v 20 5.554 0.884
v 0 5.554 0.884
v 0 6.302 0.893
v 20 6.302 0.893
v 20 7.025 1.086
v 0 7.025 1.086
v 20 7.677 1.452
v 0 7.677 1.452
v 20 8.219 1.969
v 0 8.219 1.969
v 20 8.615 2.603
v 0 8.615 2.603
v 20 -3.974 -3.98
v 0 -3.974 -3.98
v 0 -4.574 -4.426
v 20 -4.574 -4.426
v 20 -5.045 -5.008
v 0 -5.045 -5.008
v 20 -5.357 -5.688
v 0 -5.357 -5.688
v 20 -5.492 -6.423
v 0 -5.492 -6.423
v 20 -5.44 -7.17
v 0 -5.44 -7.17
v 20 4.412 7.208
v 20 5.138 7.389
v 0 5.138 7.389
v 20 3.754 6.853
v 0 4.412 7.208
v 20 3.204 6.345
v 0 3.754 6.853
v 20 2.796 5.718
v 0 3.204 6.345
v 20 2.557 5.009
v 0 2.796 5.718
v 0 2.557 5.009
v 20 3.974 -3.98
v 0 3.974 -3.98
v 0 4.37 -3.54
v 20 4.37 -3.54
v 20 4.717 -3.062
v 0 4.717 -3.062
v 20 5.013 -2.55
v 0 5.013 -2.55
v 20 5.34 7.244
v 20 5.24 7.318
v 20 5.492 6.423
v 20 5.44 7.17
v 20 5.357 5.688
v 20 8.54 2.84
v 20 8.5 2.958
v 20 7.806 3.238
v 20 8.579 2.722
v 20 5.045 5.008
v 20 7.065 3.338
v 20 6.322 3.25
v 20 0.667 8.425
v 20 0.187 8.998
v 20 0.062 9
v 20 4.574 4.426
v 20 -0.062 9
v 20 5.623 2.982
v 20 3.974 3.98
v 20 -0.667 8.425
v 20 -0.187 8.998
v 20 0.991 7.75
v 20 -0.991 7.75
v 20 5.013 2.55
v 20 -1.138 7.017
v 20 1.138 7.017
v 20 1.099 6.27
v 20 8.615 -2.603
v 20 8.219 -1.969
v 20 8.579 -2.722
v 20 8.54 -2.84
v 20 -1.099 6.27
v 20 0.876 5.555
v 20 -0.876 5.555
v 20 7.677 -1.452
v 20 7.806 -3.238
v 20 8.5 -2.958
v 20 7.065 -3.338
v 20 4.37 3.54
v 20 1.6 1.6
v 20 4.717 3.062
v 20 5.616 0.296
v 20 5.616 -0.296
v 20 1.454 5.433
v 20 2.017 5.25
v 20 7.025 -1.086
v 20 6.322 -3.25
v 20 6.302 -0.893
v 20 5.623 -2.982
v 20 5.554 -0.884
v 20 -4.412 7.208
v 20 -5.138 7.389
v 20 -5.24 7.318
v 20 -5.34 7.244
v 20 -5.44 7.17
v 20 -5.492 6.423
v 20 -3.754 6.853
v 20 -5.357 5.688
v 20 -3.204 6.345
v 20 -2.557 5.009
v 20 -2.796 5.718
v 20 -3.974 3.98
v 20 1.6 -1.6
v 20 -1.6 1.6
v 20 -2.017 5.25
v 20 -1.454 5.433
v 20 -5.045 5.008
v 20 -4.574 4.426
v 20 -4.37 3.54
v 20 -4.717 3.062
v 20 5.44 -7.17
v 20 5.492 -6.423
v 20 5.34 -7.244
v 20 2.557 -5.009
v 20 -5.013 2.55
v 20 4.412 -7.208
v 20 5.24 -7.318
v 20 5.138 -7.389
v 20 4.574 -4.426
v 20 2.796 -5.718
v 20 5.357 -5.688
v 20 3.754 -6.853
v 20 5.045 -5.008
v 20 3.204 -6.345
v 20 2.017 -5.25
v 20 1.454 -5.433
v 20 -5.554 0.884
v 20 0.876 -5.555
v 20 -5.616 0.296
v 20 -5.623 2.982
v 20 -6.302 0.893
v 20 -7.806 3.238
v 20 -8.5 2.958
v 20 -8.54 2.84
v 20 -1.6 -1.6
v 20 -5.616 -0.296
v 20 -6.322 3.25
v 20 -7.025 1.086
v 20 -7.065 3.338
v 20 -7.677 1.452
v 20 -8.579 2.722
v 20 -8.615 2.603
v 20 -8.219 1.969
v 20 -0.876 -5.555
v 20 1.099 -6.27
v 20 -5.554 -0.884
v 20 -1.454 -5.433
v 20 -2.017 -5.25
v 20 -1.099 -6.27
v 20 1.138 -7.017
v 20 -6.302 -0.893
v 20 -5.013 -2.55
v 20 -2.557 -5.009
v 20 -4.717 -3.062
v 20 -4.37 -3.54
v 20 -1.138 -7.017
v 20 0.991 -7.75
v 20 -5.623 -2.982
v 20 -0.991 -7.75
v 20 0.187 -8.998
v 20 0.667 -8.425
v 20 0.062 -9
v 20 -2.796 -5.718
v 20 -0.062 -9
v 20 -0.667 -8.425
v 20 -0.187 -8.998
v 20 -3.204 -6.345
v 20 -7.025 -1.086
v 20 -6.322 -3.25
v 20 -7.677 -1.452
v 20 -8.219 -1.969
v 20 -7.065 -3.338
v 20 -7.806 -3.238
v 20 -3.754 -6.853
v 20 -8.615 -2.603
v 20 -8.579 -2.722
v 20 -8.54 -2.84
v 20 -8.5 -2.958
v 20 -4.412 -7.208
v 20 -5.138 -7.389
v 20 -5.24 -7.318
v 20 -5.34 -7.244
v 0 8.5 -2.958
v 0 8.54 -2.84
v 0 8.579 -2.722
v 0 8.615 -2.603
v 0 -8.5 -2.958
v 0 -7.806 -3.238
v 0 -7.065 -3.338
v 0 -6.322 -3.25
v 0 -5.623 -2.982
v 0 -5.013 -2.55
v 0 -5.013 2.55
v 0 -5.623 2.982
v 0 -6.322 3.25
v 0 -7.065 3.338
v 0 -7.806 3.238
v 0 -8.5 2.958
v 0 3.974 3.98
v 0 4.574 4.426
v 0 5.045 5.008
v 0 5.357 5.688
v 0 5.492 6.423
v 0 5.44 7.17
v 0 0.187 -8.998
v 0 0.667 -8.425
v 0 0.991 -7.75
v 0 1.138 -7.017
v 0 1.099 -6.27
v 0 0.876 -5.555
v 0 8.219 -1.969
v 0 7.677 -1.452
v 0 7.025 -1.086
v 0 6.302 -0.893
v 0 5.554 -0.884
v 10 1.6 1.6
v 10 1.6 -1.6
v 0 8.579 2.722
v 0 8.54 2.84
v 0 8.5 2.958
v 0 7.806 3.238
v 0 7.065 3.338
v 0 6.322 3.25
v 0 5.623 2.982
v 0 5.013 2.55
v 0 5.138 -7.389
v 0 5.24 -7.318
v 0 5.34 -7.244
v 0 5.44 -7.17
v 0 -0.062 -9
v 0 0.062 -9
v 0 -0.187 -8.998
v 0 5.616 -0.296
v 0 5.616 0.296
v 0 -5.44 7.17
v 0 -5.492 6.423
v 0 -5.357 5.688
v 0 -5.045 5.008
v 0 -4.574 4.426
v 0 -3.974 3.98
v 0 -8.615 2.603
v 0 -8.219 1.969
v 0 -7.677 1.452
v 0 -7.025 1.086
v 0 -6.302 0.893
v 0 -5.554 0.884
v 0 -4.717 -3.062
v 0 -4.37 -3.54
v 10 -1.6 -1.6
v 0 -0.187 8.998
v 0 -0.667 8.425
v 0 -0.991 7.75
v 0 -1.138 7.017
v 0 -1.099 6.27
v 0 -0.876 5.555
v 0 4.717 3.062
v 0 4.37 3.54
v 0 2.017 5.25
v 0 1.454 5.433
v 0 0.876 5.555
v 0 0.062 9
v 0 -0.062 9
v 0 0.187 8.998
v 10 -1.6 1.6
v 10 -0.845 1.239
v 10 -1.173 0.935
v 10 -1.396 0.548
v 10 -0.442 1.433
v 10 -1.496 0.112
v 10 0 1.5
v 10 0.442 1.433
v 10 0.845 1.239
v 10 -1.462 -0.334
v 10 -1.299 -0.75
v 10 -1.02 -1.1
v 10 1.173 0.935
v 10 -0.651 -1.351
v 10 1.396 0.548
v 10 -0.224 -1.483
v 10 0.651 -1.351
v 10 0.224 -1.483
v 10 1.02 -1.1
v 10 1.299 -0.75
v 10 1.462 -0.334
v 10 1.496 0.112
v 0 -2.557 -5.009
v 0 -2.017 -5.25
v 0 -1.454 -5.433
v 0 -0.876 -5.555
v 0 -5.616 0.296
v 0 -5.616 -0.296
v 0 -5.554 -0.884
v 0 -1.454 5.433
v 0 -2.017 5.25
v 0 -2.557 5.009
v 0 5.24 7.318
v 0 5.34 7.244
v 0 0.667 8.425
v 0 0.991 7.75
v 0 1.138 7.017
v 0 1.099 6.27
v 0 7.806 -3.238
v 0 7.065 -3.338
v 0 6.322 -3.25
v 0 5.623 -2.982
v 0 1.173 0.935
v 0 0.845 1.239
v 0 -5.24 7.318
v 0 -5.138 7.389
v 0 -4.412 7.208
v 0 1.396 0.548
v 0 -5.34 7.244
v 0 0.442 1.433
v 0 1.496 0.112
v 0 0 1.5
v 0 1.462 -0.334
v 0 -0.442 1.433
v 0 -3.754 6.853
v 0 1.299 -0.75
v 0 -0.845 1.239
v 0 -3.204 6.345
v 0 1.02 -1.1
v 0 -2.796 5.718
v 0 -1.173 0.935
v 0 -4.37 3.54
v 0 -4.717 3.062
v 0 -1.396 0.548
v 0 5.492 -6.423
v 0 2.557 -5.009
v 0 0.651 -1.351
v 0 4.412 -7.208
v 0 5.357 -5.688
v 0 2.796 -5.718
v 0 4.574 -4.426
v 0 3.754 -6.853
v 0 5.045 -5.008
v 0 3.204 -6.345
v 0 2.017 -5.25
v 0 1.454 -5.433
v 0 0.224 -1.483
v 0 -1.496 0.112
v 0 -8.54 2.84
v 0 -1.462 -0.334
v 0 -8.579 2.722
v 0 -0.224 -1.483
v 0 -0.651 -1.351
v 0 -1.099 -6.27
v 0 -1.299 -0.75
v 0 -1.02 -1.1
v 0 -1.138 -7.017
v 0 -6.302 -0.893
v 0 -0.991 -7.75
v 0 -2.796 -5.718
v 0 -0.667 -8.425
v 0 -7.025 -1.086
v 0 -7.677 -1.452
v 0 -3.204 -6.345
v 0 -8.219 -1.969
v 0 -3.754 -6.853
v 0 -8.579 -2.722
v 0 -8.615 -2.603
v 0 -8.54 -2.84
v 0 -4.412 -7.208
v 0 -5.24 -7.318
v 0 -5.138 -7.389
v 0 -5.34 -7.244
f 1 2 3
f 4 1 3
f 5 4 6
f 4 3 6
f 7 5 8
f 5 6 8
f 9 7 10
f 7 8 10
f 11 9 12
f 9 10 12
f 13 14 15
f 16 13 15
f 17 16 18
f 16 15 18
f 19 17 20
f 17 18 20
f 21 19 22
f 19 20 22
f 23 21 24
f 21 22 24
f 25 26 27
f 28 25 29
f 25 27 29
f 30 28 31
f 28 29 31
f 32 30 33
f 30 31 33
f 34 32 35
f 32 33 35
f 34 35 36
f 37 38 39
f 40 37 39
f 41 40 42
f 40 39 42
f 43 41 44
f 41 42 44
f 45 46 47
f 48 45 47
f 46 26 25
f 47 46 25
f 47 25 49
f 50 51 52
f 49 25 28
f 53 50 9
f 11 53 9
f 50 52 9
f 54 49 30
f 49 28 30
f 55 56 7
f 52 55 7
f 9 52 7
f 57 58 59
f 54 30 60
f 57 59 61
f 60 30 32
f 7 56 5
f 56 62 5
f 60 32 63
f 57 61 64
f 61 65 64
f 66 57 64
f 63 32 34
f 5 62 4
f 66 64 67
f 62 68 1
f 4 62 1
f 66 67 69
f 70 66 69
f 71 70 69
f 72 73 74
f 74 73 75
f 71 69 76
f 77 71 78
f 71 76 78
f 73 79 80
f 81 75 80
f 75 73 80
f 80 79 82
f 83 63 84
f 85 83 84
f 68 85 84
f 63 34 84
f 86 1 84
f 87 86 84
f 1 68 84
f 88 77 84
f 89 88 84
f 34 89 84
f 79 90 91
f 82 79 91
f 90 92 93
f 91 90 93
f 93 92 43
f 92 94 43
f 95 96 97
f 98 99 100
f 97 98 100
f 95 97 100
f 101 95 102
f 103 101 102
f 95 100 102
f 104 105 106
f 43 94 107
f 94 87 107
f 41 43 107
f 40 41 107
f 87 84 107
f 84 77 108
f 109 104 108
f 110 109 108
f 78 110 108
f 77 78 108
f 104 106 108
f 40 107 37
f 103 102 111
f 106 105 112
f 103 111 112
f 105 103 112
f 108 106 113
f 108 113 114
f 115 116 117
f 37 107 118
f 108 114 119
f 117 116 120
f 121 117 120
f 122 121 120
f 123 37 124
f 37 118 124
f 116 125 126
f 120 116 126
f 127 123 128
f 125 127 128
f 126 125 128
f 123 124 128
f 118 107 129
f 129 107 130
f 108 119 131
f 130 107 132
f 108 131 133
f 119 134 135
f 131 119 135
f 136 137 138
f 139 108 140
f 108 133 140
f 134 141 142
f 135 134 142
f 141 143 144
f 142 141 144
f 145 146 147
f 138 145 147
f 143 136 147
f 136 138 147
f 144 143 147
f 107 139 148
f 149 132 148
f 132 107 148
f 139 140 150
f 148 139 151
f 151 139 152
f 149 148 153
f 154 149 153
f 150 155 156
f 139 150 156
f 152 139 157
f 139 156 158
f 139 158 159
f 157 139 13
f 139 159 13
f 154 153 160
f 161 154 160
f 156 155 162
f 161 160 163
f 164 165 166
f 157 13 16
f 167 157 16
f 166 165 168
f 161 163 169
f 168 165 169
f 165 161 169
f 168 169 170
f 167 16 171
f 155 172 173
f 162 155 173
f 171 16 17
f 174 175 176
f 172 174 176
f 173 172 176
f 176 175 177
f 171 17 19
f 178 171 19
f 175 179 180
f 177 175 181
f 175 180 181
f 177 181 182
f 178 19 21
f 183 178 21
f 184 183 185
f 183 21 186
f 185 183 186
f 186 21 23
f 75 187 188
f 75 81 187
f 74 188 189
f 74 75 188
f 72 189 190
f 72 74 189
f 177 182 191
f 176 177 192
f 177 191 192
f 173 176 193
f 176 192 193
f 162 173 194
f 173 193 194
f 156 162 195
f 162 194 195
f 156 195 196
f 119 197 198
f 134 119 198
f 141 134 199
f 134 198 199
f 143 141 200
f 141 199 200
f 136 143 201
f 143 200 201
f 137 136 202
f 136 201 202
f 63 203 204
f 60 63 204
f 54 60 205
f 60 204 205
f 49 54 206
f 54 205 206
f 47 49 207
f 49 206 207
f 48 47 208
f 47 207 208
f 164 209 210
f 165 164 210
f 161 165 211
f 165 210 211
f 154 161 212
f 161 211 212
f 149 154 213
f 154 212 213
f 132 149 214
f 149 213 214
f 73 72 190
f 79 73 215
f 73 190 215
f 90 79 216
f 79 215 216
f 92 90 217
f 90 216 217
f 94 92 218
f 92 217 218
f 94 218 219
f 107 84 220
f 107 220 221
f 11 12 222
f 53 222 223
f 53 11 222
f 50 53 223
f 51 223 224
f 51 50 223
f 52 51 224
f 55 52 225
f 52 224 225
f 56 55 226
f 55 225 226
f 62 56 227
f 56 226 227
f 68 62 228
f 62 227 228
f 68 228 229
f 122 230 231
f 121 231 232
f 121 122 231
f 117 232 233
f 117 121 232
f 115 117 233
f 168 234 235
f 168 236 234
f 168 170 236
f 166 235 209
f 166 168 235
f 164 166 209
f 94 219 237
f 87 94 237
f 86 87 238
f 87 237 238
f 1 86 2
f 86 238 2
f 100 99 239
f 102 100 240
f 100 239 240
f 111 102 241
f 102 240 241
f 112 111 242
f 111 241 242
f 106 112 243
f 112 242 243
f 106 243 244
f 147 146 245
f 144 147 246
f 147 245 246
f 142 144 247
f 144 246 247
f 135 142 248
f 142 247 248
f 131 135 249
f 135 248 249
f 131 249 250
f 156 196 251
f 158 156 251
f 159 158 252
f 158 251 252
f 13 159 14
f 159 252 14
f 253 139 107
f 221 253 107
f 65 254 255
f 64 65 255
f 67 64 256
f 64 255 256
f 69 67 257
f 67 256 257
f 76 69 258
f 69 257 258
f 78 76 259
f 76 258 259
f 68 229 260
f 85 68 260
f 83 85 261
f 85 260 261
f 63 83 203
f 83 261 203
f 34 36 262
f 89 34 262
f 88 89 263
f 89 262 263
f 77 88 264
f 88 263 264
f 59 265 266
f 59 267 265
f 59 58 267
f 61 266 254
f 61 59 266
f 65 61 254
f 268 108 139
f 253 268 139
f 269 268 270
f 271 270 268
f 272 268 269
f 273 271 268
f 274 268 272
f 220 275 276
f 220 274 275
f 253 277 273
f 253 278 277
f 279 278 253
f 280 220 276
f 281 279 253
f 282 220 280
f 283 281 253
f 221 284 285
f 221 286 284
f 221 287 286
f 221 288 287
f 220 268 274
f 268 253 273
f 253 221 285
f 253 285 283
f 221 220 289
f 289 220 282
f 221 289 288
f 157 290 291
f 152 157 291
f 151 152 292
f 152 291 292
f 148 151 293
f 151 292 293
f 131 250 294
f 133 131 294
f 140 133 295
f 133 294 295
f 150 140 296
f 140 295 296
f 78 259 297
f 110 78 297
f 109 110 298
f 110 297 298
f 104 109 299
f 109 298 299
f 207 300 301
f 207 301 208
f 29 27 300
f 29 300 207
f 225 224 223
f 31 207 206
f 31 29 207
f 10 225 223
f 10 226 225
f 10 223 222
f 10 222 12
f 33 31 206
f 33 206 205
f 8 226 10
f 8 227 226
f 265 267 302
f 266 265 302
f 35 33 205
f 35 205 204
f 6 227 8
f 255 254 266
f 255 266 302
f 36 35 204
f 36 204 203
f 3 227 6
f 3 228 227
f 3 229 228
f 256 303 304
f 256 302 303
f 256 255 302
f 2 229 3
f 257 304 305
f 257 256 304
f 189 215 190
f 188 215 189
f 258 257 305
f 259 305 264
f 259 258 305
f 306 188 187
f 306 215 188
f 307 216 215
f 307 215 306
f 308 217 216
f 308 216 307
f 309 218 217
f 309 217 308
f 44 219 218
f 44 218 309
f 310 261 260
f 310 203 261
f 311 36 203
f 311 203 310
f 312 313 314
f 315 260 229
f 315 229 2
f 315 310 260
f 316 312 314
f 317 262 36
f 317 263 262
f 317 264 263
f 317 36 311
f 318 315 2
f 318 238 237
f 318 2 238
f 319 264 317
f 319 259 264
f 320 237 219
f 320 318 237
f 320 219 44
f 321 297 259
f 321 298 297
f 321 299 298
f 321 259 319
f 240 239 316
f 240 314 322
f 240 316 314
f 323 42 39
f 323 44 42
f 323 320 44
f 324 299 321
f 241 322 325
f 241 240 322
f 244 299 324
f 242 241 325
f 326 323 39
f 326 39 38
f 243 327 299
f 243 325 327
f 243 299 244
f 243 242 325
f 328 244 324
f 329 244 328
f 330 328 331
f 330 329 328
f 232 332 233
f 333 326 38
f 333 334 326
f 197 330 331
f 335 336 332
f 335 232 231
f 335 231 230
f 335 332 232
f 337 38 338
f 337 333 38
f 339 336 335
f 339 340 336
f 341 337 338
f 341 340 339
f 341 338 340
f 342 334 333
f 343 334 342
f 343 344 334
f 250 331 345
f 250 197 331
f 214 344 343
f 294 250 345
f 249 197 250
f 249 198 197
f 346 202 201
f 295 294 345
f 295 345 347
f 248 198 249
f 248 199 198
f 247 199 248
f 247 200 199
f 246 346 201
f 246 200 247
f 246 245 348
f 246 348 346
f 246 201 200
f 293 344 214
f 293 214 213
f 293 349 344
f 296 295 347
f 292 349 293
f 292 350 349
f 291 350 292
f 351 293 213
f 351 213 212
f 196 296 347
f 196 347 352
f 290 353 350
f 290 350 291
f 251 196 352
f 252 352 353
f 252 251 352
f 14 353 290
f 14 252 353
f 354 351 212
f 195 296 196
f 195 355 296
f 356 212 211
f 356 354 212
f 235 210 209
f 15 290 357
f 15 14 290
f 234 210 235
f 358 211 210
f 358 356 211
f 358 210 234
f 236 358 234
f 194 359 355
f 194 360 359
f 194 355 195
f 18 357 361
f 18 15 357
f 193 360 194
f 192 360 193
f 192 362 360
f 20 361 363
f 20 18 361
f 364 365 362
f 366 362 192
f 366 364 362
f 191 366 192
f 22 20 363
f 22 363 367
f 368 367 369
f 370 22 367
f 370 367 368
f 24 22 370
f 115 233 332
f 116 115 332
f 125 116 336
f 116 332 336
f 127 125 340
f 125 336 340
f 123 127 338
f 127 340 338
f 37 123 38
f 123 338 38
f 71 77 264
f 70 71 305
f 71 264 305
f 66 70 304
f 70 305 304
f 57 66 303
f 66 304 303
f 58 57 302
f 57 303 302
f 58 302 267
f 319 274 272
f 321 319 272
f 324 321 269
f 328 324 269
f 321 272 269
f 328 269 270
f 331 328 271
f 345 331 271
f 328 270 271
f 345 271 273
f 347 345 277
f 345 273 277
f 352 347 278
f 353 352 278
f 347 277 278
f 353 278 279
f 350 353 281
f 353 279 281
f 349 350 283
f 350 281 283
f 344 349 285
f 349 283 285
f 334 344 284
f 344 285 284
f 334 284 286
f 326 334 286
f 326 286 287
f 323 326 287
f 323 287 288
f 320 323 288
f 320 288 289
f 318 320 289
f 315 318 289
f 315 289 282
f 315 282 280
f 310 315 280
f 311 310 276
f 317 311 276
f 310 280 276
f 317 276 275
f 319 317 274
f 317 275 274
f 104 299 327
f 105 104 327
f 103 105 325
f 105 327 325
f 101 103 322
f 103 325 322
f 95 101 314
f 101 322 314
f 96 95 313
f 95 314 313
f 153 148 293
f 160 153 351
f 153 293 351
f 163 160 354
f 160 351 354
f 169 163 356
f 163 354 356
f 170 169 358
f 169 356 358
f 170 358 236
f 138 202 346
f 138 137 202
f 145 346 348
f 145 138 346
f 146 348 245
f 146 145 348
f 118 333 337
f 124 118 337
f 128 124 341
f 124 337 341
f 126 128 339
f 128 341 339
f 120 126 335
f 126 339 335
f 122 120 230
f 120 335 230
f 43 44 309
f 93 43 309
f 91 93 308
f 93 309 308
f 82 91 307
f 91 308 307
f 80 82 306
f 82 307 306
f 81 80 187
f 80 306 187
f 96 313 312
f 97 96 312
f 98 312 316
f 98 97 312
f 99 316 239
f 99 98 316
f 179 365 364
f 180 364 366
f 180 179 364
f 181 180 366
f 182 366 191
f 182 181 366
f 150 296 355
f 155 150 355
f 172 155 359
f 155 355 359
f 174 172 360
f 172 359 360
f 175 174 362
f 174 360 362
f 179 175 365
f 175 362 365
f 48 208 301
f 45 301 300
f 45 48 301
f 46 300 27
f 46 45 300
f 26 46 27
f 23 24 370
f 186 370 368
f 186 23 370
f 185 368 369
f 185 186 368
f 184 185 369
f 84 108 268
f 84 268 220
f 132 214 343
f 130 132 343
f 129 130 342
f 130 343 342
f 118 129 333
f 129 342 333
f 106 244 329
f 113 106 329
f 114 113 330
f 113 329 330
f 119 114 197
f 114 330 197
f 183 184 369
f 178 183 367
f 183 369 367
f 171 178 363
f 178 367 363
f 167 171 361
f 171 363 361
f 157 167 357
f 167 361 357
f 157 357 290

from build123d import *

# Parameters (mm, degrees)
BASPROSKE_W        = 20
BASPROSKE_H        = 9
TOOTHCUT_DEPTH     = 24.706539182
TEETHCUTS_COUNT    = 10
TEETHCUTS_ANGLE    = 324
BORSKE_R           = 1.5
BORE_DEPTH         = 50.0000508
SKETCH1_W          = 3.2
SKETCH1_H          = 3.2
CUT_EXTRUDE1_DEPTH = 10


with BuildPart() as part:
    # BasProSke → Base-Revolve (revolve)
    with BuildSketch(Plane(origin=(0, 0, 0), x_dir=(1, 0, 0), z_dir=(0, 1, 0)), mode=Mode.PRIVATE) as base_revolve_sk:
        with Locations((10, 4.5)):
            Rectangle(BASPROSKE_W, BASPROSKE_H)
    revolve(base_revolve_sk.sketch.rotate(Axis((-10, 0, 0), (1, 0, 0)), 180), axis=Axis((-10, 0, 0), (1, 0, 0)))

    # TooCutSke → ToothCut (cut, through all)
    with BuildSketch(Plane(origin=(0, 0, 0), x_dir=(0, 0, -1), z_dir=(1, 0, 0))):
        with BuildLine():
            ThreePointArc((0.883878355, 5.554109745), (0, 5.624), (-0.883878355, 5.554109745))
            ThreePointArc((-0.883878355, 5.554109745), (-1.258245767, 7.379188248), (-2.637816971, 8.631324741))
            ThreePointArc((-2.637816971, 8.631324741), (0, 9.0254), (2.637816971, 8.631324741))
            ThreePointArc((2.637816971, 8.631324741), (1.258245767, 7.379188248), (0.883878355, 5.554109745))
        make_face()
    toothcut = extrude(amount=TOOTHCUT_DEPTH, mode=Mode.SUBTRACT)

    # TeethCuts: ToothCut ×10 about axis
    teethcuts_axis = Axis((-10, 0, 0), (1, 0, 0))
    for i in range(1, TEETHCUTS_COUNT):
        add(toothcut.rotate(teethcuts_axis, i * TEETHCUTS_ANGLE / (TEETHCUTS_COUNT - 1)), mode=Mode.SUBTRACT)

    # BorSke → Bore (cut, symmetric)
    with BuildSketch(Plane(origin=(0, 0, 0), x_dir=(0, 0, -1), z_dir=(1, 0, 0))):
        with Locations(Location((0, 0, 0), (0, 0, 180))):
            Circle(BORSKE_R)
    extrude(amount=BORE_DEPTH, both=True, mode=Mode.SUBTRACT)

    # Sketch1 → Cut-Extrude1 (cut)
    with BuildSketch(Plane(origin=(20, 0, 0), x_dir=(0, 0, -1), z_dir=(1, 0, 0))):
        Rectangle(SKETCH1_W, SKETCH1_H)
    extrude(amount=-CUT_EXTRUDE1_DEPTH, mode=Mode.SUBTRACT)


solid = part.part
